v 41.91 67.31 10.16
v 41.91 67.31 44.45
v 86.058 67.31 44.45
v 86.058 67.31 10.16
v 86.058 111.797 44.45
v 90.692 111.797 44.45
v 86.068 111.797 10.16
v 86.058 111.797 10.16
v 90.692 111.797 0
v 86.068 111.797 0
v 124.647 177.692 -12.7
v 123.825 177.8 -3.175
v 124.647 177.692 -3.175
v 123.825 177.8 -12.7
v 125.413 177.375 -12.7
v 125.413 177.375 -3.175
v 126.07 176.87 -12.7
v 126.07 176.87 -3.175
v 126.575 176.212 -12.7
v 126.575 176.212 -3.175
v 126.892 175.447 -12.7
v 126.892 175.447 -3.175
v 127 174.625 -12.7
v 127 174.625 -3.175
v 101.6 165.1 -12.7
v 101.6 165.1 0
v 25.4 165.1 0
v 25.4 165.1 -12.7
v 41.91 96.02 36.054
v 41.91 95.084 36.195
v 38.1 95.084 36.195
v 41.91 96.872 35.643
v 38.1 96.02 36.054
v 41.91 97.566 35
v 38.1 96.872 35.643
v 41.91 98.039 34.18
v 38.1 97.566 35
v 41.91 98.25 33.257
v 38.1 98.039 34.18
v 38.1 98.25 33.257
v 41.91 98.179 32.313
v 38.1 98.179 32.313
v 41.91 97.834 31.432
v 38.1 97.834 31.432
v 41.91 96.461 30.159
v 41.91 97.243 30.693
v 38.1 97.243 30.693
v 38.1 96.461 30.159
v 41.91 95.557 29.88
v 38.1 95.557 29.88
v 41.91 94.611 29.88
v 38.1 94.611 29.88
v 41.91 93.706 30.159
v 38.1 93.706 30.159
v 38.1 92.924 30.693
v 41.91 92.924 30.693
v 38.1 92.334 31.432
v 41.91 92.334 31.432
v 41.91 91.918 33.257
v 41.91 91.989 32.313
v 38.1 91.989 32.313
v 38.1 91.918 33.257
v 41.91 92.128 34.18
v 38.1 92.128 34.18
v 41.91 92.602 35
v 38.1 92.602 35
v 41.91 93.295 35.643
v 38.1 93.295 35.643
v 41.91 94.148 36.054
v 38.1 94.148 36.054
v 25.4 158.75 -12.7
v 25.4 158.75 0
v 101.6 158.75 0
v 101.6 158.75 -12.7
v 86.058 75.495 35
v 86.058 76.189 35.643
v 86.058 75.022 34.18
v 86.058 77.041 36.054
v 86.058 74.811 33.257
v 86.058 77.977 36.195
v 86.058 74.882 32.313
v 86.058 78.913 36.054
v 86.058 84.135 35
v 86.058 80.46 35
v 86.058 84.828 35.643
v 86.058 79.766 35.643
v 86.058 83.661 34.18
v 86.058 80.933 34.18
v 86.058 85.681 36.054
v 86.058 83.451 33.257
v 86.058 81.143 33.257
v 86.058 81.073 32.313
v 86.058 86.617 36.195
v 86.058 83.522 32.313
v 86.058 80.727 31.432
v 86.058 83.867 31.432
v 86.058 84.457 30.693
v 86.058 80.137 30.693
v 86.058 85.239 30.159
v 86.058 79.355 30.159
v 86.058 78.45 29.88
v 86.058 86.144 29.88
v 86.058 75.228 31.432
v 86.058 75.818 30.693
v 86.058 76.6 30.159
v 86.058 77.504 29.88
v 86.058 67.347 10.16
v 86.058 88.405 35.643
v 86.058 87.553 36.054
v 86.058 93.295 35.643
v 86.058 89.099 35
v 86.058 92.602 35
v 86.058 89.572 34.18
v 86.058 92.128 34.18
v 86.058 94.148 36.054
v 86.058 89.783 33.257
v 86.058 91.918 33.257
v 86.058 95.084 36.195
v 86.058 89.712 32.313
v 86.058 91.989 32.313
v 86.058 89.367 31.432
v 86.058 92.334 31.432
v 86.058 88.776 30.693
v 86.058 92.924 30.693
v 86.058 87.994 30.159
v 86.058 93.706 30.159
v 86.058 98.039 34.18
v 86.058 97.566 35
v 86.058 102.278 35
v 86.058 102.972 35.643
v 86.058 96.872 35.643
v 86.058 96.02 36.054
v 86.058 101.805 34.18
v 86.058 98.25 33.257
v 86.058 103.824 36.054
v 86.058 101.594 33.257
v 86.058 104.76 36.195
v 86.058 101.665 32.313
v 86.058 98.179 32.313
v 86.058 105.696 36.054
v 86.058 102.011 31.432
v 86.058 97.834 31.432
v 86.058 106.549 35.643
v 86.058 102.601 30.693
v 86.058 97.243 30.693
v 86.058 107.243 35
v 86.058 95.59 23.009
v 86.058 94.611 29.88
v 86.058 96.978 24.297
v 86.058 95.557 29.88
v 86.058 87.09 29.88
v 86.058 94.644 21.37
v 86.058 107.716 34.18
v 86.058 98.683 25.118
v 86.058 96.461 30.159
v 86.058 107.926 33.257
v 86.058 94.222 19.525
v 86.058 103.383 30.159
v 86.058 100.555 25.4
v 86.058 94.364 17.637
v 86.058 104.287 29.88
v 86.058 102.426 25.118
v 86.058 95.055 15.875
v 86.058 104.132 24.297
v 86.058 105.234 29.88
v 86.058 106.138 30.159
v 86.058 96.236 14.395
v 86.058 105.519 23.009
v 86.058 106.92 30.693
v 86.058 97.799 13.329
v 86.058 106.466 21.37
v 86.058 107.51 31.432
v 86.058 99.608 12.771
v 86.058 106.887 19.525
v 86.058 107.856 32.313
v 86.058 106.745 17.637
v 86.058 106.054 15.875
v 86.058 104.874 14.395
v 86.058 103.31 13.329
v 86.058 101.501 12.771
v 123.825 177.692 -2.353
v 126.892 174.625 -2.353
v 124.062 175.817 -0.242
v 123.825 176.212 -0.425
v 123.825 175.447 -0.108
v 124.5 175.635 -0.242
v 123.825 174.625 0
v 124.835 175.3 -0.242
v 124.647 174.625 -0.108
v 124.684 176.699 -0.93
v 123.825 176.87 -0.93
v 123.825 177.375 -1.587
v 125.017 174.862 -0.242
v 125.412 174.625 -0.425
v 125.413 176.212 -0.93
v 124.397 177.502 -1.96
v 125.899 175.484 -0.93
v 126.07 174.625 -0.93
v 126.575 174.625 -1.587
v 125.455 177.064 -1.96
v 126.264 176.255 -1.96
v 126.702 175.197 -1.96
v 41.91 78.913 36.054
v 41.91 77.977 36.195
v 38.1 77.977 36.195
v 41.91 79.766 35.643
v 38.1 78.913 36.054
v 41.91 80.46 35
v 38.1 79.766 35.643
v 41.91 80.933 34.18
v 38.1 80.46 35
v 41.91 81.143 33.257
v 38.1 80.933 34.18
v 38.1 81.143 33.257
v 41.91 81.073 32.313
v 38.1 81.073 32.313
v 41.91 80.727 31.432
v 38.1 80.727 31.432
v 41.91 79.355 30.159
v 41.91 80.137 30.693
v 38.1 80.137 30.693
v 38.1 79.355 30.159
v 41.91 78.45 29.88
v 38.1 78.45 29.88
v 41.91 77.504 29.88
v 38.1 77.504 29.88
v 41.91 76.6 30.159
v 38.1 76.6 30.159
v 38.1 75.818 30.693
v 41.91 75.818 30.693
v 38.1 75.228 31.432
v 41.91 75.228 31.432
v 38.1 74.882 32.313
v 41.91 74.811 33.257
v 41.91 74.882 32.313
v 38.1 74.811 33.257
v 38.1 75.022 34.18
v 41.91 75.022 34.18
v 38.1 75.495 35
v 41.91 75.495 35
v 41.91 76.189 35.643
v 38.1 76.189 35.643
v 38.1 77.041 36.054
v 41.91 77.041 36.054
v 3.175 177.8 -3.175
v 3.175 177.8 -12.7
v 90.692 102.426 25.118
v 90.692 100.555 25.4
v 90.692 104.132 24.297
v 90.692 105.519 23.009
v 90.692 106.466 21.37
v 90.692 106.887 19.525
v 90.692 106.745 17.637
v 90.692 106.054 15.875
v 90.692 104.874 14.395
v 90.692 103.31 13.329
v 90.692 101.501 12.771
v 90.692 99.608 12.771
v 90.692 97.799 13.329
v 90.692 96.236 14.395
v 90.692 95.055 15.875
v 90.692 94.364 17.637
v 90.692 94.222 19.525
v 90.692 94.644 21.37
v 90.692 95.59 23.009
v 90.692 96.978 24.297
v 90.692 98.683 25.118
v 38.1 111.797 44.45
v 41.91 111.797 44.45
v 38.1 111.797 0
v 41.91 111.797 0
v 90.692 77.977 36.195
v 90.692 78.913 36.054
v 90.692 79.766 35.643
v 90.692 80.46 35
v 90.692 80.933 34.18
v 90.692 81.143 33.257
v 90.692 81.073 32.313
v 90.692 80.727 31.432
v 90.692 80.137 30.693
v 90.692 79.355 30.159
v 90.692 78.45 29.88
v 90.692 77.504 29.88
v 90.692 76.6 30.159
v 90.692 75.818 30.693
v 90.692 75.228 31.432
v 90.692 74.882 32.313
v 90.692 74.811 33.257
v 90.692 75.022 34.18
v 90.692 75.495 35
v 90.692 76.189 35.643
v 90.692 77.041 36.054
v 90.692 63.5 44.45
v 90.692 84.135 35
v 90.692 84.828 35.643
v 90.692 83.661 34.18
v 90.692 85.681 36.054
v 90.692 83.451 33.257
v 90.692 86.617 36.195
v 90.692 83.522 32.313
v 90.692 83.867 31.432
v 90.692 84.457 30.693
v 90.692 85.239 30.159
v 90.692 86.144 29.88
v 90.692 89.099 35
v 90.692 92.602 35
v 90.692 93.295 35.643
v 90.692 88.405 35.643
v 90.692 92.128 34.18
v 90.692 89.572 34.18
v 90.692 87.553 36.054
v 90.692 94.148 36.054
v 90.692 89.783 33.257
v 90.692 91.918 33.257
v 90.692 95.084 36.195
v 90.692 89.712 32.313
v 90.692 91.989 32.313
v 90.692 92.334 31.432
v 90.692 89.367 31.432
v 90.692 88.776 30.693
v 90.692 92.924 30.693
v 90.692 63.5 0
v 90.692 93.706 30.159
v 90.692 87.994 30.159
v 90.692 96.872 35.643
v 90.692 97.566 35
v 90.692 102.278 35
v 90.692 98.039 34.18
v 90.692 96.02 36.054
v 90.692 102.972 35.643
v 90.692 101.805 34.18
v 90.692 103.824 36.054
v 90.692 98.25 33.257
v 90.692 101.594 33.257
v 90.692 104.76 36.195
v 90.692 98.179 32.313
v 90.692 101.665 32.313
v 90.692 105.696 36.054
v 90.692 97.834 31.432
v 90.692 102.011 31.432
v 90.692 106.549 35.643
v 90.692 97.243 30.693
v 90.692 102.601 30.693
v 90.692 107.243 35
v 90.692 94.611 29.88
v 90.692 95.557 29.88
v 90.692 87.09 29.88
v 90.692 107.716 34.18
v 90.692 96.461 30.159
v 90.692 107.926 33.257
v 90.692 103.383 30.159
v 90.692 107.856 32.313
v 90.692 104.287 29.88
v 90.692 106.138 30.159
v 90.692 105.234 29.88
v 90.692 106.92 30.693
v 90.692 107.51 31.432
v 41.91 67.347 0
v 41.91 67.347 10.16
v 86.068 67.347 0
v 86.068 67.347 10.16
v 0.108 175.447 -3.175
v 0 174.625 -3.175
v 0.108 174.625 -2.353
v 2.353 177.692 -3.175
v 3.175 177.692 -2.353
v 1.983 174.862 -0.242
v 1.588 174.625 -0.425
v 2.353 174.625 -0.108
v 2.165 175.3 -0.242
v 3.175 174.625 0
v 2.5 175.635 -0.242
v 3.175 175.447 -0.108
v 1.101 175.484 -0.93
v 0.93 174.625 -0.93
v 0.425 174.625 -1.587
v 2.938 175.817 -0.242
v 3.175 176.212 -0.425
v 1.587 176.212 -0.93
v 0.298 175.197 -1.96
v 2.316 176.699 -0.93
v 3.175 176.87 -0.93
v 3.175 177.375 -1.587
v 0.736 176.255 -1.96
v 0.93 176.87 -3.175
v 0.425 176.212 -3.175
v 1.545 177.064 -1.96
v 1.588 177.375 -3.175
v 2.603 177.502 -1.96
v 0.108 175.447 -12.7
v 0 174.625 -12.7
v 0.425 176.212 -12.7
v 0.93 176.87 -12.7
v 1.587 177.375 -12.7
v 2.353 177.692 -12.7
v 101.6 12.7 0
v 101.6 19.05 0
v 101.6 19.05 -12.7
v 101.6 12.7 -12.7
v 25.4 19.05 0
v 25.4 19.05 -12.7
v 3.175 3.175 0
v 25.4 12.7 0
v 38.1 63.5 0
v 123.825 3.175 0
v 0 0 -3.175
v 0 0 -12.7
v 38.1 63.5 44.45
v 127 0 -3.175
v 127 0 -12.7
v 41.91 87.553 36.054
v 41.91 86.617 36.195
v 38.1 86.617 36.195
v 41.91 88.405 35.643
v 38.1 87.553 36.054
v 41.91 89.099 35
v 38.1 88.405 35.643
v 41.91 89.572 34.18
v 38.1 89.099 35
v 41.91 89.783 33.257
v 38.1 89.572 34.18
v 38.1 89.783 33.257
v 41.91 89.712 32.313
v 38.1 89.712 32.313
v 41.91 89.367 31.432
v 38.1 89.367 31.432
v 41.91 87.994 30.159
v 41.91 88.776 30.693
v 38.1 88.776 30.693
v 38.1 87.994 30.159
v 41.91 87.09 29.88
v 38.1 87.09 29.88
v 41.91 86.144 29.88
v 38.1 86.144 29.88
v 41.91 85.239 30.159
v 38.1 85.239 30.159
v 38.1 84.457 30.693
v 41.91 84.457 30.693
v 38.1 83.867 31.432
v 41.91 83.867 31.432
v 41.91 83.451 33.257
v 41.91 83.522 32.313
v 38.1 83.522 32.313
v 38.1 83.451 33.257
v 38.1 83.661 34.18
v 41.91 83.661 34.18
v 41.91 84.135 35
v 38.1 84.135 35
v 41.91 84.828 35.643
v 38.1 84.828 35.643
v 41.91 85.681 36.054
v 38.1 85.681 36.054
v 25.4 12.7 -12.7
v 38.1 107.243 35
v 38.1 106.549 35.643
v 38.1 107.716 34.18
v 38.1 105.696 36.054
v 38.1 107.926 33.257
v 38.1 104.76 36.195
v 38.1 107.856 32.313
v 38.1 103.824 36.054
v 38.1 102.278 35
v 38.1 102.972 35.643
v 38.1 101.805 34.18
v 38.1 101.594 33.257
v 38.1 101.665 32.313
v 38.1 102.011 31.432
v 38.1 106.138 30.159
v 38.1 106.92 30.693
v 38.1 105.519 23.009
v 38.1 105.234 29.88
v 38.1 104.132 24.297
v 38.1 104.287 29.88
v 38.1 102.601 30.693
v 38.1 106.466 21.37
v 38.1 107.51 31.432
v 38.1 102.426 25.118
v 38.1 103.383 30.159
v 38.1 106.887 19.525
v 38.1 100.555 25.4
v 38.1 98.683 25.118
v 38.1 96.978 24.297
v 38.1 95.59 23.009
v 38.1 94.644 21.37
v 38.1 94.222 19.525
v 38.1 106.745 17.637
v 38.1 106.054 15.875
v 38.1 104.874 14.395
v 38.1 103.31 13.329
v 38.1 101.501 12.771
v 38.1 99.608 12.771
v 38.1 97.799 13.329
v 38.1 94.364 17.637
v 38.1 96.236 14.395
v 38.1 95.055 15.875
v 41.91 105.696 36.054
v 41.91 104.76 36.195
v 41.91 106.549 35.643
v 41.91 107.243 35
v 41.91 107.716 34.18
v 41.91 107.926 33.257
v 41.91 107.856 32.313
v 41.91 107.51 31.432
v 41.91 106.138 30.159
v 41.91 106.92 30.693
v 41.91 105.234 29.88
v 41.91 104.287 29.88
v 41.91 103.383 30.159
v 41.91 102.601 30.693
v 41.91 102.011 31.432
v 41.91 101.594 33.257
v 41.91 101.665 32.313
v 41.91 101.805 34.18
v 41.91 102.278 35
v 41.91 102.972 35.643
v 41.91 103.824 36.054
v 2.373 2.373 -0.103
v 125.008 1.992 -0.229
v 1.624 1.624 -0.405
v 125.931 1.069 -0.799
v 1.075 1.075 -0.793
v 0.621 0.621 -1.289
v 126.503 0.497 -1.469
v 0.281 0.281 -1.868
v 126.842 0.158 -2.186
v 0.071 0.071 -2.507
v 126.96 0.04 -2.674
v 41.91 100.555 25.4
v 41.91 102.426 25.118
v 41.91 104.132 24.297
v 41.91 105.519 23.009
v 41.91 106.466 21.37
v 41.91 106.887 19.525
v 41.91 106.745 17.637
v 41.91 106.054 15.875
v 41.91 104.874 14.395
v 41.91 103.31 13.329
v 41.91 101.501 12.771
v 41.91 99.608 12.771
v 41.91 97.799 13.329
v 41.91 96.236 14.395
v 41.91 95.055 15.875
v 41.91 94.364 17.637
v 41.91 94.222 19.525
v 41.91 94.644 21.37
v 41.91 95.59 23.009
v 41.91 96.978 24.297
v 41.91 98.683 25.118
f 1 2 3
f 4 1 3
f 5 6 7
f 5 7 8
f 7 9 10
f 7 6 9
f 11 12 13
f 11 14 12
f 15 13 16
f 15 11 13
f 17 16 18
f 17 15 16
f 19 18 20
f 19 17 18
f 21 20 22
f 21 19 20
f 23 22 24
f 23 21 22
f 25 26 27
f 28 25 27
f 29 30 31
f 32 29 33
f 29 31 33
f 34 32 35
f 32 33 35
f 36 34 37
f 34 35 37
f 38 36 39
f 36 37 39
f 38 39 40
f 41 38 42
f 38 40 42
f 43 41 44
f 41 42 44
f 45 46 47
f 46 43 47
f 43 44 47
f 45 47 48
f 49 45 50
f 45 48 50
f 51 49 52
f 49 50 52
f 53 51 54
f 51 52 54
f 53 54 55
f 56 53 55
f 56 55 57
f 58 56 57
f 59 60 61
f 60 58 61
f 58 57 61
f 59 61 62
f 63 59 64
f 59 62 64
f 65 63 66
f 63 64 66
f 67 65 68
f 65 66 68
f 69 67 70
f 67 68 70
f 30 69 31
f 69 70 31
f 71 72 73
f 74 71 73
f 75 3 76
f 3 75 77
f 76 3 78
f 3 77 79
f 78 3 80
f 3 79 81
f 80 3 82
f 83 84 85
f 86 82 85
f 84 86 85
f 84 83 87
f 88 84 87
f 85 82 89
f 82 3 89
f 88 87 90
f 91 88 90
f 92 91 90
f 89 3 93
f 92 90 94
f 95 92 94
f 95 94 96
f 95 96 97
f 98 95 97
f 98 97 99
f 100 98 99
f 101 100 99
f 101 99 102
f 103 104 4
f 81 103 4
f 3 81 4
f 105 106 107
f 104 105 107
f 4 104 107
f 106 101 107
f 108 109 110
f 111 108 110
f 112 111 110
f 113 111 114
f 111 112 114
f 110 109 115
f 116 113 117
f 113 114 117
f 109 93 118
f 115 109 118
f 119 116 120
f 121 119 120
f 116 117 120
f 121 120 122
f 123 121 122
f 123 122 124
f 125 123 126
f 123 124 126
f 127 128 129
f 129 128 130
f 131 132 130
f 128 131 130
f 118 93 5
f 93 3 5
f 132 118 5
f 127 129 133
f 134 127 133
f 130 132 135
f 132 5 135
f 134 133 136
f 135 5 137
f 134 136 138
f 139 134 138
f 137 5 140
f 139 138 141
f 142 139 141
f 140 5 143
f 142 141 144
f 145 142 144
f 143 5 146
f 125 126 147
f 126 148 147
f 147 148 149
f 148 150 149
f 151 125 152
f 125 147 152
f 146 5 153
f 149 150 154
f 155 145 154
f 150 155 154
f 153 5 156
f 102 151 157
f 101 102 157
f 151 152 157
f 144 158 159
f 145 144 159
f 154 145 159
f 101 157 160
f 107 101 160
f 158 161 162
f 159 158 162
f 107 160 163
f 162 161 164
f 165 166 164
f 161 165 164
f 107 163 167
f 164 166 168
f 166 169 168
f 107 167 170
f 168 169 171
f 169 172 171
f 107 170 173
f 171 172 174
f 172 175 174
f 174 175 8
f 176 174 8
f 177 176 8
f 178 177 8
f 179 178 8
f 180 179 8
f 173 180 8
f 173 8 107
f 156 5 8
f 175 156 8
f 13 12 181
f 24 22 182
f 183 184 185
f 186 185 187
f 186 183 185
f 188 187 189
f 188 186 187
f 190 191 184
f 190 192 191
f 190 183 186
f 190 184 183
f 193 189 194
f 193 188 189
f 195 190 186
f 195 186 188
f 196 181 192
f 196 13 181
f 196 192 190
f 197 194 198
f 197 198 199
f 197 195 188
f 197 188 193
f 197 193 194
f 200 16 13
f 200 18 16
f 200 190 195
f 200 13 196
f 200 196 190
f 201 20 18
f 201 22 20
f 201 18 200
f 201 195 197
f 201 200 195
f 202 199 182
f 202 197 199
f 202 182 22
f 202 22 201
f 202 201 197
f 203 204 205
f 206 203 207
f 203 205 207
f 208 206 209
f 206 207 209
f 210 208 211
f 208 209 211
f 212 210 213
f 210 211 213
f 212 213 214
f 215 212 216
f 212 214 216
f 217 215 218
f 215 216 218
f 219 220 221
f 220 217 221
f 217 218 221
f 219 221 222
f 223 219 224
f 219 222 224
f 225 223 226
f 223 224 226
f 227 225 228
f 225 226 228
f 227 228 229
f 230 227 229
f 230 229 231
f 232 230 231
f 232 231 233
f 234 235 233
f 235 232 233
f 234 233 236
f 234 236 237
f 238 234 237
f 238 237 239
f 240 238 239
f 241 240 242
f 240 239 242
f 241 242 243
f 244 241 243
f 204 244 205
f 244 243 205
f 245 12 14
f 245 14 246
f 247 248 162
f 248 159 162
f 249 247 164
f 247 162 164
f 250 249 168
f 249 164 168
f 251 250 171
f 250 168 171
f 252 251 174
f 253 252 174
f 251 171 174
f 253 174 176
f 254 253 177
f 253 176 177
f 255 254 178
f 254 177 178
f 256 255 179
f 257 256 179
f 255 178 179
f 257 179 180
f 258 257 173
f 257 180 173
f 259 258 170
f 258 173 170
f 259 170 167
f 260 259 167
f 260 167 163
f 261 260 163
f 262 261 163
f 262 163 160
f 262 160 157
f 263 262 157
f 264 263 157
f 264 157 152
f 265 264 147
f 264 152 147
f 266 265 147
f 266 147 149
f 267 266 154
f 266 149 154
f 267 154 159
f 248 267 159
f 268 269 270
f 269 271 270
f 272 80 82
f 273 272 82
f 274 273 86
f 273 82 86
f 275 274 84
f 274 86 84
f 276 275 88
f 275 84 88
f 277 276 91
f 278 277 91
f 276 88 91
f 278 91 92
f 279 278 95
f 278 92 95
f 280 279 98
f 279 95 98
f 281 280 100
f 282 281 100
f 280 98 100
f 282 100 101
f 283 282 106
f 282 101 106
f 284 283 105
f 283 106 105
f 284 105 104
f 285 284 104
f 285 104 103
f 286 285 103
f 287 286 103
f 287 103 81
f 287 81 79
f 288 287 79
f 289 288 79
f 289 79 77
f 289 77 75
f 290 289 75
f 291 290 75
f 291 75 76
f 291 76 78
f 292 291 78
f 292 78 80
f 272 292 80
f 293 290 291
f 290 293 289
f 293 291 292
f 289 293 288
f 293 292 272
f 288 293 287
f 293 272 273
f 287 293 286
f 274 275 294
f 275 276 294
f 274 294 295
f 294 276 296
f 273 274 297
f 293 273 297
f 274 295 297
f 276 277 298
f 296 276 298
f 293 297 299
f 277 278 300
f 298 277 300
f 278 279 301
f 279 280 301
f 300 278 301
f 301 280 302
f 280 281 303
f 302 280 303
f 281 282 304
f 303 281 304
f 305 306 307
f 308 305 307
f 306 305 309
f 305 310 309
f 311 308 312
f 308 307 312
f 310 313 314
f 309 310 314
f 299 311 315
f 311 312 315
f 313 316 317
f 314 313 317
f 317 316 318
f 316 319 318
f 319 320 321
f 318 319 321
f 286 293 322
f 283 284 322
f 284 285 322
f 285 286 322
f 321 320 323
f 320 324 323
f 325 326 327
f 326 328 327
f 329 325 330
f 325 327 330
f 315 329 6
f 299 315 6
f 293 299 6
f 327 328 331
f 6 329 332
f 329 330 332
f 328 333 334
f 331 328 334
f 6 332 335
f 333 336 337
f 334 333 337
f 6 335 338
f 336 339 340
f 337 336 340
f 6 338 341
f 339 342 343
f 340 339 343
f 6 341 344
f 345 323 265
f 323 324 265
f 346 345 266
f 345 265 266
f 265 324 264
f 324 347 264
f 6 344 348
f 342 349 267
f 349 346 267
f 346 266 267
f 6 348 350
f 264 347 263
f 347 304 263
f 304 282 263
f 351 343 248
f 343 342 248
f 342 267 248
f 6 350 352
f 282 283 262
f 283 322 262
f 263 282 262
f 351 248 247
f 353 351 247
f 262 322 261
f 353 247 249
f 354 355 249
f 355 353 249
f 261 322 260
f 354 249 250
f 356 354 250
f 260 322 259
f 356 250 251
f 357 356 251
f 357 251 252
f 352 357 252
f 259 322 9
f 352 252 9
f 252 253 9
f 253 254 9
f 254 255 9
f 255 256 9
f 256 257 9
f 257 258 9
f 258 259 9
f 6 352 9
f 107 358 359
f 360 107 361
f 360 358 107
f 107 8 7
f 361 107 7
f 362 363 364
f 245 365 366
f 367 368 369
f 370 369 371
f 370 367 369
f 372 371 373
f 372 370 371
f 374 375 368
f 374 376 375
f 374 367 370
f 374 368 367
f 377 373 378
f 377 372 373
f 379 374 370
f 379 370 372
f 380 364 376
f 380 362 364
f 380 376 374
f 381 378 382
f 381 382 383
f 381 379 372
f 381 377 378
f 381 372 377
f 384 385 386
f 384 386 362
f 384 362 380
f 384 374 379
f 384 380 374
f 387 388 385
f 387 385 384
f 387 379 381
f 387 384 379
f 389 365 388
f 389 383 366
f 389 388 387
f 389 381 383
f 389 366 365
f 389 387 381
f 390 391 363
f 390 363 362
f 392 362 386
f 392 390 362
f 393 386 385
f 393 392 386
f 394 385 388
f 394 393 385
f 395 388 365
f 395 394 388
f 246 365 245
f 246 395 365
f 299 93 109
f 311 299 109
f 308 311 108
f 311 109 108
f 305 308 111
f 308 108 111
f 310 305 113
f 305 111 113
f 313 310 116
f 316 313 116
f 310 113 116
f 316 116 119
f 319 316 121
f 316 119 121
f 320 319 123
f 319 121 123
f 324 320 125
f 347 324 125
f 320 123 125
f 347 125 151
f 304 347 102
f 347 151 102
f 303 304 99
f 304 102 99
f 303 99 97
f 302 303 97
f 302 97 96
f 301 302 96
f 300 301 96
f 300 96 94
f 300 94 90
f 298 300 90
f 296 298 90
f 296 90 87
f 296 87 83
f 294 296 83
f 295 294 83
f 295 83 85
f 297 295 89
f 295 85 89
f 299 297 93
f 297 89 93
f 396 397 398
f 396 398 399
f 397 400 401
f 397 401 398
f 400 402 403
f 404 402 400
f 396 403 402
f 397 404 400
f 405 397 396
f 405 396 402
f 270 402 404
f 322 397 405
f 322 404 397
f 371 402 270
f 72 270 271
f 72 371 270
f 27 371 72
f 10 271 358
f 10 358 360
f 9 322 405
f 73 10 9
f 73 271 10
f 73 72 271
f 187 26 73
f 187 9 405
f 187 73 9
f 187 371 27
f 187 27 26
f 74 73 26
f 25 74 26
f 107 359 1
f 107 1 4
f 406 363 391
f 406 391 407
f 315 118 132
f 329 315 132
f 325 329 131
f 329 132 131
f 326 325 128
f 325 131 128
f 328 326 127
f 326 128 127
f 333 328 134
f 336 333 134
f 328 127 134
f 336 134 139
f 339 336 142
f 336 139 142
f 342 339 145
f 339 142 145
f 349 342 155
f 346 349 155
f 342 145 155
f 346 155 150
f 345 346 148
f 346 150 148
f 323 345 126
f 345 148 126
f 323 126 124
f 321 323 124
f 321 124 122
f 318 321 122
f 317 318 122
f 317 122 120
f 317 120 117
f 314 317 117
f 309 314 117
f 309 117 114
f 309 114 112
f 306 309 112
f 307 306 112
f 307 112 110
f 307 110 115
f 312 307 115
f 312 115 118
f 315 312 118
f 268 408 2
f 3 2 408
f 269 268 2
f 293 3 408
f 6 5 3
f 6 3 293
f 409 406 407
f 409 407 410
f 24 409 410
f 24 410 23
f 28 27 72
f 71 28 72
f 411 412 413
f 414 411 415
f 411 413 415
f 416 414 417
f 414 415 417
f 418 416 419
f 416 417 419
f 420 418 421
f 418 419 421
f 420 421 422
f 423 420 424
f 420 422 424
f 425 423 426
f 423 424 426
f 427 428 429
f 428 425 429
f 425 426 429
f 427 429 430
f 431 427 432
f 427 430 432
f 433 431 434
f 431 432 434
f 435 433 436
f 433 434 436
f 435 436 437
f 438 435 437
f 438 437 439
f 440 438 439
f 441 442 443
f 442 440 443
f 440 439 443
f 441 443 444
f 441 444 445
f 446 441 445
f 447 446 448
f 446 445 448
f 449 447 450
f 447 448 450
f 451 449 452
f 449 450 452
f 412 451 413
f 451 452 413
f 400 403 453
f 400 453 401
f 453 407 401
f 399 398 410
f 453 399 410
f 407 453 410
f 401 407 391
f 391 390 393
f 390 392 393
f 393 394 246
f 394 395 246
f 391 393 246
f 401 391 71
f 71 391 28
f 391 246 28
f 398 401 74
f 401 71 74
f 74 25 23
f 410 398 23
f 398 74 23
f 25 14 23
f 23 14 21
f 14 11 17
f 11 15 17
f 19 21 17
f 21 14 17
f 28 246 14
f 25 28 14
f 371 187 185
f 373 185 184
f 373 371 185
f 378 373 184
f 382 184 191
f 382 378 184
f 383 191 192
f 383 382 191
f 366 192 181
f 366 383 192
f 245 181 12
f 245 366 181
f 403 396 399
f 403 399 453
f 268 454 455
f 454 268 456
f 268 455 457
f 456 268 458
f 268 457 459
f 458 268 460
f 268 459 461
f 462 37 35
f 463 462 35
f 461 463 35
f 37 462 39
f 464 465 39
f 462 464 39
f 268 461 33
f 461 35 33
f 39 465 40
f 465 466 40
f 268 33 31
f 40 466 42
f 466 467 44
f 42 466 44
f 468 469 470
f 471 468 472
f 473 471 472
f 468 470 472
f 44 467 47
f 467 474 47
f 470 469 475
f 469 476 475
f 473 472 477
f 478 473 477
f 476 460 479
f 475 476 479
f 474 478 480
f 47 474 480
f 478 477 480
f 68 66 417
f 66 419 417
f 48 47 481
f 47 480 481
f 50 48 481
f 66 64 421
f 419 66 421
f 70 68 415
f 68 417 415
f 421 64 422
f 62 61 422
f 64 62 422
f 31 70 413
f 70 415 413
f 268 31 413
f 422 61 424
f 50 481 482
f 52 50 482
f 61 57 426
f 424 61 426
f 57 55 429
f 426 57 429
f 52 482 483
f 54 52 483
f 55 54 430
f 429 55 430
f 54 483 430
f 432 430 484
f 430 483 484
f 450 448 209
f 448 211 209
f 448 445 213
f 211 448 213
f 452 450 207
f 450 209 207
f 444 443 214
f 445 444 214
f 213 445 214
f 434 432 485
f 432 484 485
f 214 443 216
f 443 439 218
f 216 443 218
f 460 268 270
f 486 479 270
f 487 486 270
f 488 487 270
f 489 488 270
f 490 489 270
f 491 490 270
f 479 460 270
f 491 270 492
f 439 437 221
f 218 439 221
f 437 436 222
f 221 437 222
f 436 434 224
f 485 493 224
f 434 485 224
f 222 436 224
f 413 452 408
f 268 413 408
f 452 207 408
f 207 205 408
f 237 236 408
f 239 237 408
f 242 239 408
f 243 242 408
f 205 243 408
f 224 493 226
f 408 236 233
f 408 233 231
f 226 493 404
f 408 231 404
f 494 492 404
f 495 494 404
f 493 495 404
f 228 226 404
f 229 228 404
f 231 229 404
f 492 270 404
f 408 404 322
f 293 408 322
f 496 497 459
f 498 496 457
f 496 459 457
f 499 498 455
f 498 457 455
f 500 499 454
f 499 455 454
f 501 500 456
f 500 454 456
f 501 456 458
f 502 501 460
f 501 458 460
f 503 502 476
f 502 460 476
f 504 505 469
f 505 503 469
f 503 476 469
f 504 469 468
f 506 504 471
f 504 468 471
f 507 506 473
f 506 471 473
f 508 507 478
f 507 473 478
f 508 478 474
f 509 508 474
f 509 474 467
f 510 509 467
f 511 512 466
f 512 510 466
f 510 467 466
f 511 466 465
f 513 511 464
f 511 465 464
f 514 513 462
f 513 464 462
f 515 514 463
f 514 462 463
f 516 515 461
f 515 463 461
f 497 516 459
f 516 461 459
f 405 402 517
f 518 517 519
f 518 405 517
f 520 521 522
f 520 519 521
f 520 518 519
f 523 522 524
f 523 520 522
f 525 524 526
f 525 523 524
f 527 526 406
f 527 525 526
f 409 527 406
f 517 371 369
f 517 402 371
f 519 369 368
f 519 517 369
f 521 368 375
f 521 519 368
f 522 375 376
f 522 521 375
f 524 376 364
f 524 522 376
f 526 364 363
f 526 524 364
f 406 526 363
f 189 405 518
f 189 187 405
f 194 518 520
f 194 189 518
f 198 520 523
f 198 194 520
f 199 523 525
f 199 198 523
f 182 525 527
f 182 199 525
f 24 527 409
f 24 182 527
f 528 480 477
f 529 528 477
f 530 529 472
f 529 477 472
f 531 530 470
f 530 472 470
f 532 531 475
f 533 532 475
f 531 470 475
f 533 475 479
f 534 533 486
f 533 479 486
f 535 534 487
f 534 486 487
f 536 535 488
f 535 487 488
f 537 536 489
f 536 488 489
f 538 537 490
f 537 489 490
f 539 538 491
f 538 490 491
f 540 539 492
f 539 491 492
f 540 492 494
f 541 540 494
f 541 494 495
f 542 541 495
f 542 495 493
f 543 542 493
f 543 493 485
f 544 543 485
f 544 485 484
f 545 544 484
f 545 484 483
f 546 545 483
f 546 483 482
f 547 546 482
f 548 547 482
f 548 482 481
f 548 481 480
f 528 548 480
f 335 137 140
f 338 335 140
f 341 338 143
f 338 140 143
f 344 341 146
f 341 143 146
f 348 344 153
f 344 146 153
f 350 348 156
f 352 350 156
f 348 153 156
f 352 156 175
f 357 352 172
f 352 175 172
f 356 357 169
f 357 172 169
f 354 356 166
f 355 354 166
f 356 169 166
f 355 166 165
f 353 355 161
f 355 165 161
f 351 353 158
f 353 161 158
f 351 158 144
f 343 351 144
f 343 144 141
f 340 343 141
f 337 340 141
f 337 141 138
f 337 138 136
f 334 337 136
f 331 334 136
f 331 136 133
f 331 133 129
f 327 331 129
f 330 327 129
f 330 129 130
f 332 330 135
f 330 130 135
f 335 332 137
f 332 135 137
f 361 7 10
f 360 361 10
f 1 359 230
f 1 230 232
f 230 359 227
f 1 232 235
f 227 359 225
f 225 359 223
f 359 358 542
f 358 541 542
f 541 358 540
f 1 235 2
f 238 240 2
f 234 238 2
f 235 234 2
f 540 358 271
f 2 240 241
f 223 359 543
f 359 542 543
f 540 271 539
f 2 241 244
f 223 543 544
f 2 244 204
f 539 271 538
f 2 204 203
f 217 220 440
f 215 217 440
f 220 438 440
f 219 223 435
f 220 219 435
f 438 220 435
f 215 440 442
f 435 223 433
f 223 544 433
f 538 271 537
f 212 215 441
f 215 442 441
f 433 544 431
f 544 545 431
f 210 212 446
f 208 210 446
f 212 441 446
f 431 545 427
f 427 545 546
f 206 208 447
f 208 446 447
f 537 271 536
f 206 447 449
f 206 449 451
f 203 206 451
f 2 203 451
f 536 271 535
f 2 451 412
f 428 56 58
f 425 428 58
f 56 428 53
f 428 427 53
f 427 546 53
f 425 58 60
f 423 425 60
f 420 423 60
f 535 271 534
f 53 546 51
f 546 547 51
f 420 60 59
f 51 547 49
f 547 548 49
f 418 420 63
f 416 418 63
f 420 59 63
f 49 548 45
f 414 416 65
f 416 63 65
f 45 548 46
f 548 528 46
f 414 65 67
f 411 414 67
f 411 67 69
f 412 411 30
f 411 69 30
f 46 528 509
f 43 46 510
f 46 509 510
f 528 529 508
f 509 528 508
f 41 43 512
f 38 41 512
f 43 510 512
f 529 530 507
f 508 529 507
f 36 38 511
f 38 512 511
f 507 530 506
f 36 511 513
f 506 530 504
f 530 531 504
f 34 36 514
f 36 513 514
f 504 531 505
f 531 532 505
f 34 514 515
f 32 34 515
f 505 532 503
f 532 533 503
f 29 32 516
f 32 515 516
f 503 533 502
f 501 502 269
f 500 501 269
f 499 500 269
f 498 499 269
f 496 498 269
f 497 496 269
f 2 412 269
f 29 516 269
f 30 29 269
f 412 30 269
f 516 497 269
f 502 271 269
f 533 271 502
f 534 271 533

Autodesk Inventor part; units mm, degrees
ref_plane "YZ Plane" through (0, 0, 0) normal (1, 0, 0) x (0, 1, 0)
ref_plane "XZ Plane" through (0, 0, 0) normal (0, 1, 0) x (-1, 0, 0)
ref_plane "XY Plane" through (0, 0, 0) normal (0, 0, 1) x (1, 0, 0)
sketch "Sketch1" plane through (0, 0, 0) normal (0, 0, 1) x (1, 0, 0)
  line L0 (0, 0) -> (127, 0)
  line L1 (127, 0) -> (127, 177.8)
  line L2 (127, 177.8) -> (0, 177.8)
  line L3 (0, 177.8) -> (0, 0)
  dimension "d0" = 127
  dimension "d1" = 177.8
extrude "Extrusion1" add sketch "Sketch1" against normal blind 12.7
sketch "Sketch2" plane through (0, 0, 0) normal (0, 0, 1) x (1, 0, 0)
  line L0 (0, 0) -> (0, 177.8) projected
  line L1 (127, 177.8) -> (127, 0) projected
  line L2 (25.4, 158.75) -> (101.6, 158.75)
  line L3 (101.6, 158.75) -> (101.6, 165.1)
  line L4 (101.6, 165.1) -> (25.4, 165.1)
  line L5 (25.4, 165.1) -> (25.4, 158.75)
  line L6 (25.4, 19.05) -> (101.6, 19.05)
  line L7 (101.6, 19.05) -> (101.6, 12.7)
  line L8 (101.6, 12.7) -> (25.4, 12.7)
  line L9 (25.4, 12.7) -> (25.4, 19.05)
  point P0 (63.5, 158.75)
  point P1 (101.6, 158.75)
  point P2 (63.5, 41.3327)
  dimension "d25" = 6.35
  dimension "d26" = 6.35
sketch "Sketch3" plane through (0, 0, 0) normal (0, 0, 1) x (1, 0, 0)
  point P0 (0, 0)
sketch "Sketch4" plane through (0, 0, 0) normal (0, 0, 1) x (1, 0, 0)
  line L0 (38.1, 63.5) -> (90.6923, 63.5)
  line L1 (90.6923, 63.5) -> (90.6923, 111.7968)
  line L2 (90.6923, 111.7968) -> (38.1, 111.7968)
  line L3 (38.1, 111.7968) -> (38.1, 63.5)
  point P0 (0, 0)
extrude "Extrusion2" add sketch "Sketch4" along normal blind 44.45
sketch "Sketch5" plane through (38.1, 63.5, 0) normal (-1, 0, 0) x (0, 0, 1)
  circle A0 centre (19.05, 37.0546) radius 6.35
  circle A1 centre (33.02, 41.2603) radius 3.175
  circle A2 centre (33.02, 31.5839) radius 3.175
  circle A3 centre (33.02, 23.1169) radius 3.175
  circle A4 centre (33.02, 14.4772) radius 3.175
  circle A5 centre (33.02, 5.8375) radius 3.175
  line L0 (0, 114.3) -> (0, -63.5) projected
  line L1 (44.45, 48.2968) -> (44.45, 0) projected
  dimension "d10" = 6.35
  dimension "d29" = 19.05
  dimension "d30" = 11.43
  dimension "d31" = 11.43
  dimension "d32" = 11.43
  dimension "d33" = 11.43
  dimension "d34" = 11.43
extrude "Extrusion3" cut sketch "Sketch5" against normal blind 254 contours A0
extrude "Extrusion5" cut sketch "Sketch5" against normal blind 254 contours A1 | A2 | A3 | A4
sketch "Sketch6" plane through (0, 0, 44.45) normal (0, 0, 1) x (1, 0, 0)
  line L0 (38.1, 107.9353) -> (90.6923, 107.9353) projected
  line L1 (41.91, 67.31) -> (86.0576, 67.31)
  line L2 (86.0576, 67.31) -> (86.0576, 107.9353)
  line L3 (86.0576, 107.9353) -> (41.91, 107.9353)
  line L4 (41.91, 107.9353) -> (41.91, 67.31)
  point P0 (0, 0)
extrude "Extrusion6" cut sketch "Sketch6" against normal blind 34.29
sketch "Sketch7" plane through (38.1, 111.7968, 0) normal (0, 1, 0) x (1, 0, 0)
  line L0 (3.81, -44.45) -> (3.81, -33.02) projected
  line L1 (3.81, -10.16) -> (47.9576, -10.16) projected
  line L2 (3.81, -38.735) -> (47.9576, -38.735)
  line L3 (47.9576, -38.735) -> (47.9576, -10.16)
  line L4 (47.9576, -10.16) -> (3.81, -10.16)
  line L5 (3.81, -10.16) -> (3.81, -38.735)
  line L6 (3.81, -38.735) -> (47.9576, -38.735)
  line L7 (47.9576, -38.735) -> (47.9576, -50.1618)
  line L8 (47.9576, -50.1618) -> (3.81, -50.1618)
  line L9 (3.81, -50.1618) -> (3.81, -38.735)
  point P0 (-38.1, 0)
extrude "Extrusion7" cut sketch "Sketch7" against normal blind 34.29 contours L0 L5 L1 L3 L2
extrude "Extrusion8" cut sketch "Sketch7" against normal blind 34.29 contours L0 L2 L7 L8 L9
extrude "Extrusion11" cut sketch "Sketch2" against normal blind 25.4
sketch "Sketch8" plane through (38.1, 111.7968, 0) normal (0, 1, 0) x (1, 0, 0)
  line L0 (47.9576, -10.16) -> (3.81, -10.16) projected
  line L1 (63.5, 0) -> (-12.7, 0) projected
  line L2 (3.81, -10.16) -> (47.9681, -10.16)
  line L3 (47.9681, -10.16) -> (47.9681, 0)
  line L4 (47.9681, 0) -> (3.81, 0)
  line L5 (3.81, 0) -> (3.81, -10.16)
  point P0 (-38.1, 0)
extrude "Extrusion12" cut sketch "Sketch8" against normal blind 44.45
fillet "Fillet1" radius 3.175 6 edges at (0, 177.8, -6.35) (127, 177.8, -6.35) (63.5, 177.8, 0) (127, 88.9, 0) (0, 88.9, 0) (63.5, 0, 0)
properties part number "LucasCharles Part 1 wall mount FINAL v2" material "Stainless Steel, Austenitic"
